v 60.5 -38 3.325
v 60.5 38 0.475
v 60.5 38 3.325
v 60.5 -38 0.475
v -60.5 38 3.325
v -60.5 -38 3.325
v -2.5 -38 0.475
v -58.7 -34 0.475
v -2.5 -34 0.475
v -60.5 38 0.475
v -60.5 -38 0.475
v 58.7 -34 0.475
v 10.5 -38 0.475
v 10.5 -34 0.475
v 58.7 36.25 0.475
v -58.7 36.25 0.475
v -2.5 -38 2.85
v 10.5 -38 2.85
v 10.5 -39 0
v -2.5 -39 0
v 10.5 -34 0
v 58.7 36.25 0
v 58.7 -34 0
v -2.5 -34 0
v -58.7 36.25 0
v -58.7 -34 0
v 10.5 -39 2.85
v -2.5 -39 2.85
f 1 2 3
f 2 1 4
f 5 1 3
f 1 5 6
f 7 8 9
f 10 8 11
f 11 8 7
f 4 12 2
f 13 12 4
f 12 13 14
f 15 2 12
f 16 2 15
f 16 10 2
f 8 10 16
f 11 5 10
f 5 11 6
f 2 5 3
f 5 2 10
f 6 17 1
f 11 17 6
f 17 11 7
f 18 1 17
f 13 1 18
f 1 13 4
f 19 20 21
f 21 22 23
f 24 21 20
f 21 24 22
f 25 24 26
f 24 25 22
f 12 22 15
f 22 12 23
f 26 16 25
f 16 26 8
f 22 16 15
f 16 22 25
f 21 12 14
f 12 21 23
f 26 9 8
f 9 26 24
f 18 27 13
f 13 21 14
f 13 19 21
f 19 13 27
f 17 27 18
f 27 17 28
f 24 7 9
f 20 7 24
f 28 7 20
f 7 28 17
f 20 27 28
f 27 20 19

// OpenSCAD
module display() {
    // Main display body
    translate([0, 0, 1.9])
    cube([121, 76, 2.85], center=true);

    // PCB aperture
    translate([-54, -30.225, 0])
    cube([108, 64.8, 0.5], center=false);

    // Touch screen
    translate([-58.7, -34, 0])
    cube([117.4, 70.25, 1], center=false);

    // Clearance for the touch screen ribbon
    translate([-2.5, -39, 0])
    cube([13, 6, 2.85], center=false);
}

display();
